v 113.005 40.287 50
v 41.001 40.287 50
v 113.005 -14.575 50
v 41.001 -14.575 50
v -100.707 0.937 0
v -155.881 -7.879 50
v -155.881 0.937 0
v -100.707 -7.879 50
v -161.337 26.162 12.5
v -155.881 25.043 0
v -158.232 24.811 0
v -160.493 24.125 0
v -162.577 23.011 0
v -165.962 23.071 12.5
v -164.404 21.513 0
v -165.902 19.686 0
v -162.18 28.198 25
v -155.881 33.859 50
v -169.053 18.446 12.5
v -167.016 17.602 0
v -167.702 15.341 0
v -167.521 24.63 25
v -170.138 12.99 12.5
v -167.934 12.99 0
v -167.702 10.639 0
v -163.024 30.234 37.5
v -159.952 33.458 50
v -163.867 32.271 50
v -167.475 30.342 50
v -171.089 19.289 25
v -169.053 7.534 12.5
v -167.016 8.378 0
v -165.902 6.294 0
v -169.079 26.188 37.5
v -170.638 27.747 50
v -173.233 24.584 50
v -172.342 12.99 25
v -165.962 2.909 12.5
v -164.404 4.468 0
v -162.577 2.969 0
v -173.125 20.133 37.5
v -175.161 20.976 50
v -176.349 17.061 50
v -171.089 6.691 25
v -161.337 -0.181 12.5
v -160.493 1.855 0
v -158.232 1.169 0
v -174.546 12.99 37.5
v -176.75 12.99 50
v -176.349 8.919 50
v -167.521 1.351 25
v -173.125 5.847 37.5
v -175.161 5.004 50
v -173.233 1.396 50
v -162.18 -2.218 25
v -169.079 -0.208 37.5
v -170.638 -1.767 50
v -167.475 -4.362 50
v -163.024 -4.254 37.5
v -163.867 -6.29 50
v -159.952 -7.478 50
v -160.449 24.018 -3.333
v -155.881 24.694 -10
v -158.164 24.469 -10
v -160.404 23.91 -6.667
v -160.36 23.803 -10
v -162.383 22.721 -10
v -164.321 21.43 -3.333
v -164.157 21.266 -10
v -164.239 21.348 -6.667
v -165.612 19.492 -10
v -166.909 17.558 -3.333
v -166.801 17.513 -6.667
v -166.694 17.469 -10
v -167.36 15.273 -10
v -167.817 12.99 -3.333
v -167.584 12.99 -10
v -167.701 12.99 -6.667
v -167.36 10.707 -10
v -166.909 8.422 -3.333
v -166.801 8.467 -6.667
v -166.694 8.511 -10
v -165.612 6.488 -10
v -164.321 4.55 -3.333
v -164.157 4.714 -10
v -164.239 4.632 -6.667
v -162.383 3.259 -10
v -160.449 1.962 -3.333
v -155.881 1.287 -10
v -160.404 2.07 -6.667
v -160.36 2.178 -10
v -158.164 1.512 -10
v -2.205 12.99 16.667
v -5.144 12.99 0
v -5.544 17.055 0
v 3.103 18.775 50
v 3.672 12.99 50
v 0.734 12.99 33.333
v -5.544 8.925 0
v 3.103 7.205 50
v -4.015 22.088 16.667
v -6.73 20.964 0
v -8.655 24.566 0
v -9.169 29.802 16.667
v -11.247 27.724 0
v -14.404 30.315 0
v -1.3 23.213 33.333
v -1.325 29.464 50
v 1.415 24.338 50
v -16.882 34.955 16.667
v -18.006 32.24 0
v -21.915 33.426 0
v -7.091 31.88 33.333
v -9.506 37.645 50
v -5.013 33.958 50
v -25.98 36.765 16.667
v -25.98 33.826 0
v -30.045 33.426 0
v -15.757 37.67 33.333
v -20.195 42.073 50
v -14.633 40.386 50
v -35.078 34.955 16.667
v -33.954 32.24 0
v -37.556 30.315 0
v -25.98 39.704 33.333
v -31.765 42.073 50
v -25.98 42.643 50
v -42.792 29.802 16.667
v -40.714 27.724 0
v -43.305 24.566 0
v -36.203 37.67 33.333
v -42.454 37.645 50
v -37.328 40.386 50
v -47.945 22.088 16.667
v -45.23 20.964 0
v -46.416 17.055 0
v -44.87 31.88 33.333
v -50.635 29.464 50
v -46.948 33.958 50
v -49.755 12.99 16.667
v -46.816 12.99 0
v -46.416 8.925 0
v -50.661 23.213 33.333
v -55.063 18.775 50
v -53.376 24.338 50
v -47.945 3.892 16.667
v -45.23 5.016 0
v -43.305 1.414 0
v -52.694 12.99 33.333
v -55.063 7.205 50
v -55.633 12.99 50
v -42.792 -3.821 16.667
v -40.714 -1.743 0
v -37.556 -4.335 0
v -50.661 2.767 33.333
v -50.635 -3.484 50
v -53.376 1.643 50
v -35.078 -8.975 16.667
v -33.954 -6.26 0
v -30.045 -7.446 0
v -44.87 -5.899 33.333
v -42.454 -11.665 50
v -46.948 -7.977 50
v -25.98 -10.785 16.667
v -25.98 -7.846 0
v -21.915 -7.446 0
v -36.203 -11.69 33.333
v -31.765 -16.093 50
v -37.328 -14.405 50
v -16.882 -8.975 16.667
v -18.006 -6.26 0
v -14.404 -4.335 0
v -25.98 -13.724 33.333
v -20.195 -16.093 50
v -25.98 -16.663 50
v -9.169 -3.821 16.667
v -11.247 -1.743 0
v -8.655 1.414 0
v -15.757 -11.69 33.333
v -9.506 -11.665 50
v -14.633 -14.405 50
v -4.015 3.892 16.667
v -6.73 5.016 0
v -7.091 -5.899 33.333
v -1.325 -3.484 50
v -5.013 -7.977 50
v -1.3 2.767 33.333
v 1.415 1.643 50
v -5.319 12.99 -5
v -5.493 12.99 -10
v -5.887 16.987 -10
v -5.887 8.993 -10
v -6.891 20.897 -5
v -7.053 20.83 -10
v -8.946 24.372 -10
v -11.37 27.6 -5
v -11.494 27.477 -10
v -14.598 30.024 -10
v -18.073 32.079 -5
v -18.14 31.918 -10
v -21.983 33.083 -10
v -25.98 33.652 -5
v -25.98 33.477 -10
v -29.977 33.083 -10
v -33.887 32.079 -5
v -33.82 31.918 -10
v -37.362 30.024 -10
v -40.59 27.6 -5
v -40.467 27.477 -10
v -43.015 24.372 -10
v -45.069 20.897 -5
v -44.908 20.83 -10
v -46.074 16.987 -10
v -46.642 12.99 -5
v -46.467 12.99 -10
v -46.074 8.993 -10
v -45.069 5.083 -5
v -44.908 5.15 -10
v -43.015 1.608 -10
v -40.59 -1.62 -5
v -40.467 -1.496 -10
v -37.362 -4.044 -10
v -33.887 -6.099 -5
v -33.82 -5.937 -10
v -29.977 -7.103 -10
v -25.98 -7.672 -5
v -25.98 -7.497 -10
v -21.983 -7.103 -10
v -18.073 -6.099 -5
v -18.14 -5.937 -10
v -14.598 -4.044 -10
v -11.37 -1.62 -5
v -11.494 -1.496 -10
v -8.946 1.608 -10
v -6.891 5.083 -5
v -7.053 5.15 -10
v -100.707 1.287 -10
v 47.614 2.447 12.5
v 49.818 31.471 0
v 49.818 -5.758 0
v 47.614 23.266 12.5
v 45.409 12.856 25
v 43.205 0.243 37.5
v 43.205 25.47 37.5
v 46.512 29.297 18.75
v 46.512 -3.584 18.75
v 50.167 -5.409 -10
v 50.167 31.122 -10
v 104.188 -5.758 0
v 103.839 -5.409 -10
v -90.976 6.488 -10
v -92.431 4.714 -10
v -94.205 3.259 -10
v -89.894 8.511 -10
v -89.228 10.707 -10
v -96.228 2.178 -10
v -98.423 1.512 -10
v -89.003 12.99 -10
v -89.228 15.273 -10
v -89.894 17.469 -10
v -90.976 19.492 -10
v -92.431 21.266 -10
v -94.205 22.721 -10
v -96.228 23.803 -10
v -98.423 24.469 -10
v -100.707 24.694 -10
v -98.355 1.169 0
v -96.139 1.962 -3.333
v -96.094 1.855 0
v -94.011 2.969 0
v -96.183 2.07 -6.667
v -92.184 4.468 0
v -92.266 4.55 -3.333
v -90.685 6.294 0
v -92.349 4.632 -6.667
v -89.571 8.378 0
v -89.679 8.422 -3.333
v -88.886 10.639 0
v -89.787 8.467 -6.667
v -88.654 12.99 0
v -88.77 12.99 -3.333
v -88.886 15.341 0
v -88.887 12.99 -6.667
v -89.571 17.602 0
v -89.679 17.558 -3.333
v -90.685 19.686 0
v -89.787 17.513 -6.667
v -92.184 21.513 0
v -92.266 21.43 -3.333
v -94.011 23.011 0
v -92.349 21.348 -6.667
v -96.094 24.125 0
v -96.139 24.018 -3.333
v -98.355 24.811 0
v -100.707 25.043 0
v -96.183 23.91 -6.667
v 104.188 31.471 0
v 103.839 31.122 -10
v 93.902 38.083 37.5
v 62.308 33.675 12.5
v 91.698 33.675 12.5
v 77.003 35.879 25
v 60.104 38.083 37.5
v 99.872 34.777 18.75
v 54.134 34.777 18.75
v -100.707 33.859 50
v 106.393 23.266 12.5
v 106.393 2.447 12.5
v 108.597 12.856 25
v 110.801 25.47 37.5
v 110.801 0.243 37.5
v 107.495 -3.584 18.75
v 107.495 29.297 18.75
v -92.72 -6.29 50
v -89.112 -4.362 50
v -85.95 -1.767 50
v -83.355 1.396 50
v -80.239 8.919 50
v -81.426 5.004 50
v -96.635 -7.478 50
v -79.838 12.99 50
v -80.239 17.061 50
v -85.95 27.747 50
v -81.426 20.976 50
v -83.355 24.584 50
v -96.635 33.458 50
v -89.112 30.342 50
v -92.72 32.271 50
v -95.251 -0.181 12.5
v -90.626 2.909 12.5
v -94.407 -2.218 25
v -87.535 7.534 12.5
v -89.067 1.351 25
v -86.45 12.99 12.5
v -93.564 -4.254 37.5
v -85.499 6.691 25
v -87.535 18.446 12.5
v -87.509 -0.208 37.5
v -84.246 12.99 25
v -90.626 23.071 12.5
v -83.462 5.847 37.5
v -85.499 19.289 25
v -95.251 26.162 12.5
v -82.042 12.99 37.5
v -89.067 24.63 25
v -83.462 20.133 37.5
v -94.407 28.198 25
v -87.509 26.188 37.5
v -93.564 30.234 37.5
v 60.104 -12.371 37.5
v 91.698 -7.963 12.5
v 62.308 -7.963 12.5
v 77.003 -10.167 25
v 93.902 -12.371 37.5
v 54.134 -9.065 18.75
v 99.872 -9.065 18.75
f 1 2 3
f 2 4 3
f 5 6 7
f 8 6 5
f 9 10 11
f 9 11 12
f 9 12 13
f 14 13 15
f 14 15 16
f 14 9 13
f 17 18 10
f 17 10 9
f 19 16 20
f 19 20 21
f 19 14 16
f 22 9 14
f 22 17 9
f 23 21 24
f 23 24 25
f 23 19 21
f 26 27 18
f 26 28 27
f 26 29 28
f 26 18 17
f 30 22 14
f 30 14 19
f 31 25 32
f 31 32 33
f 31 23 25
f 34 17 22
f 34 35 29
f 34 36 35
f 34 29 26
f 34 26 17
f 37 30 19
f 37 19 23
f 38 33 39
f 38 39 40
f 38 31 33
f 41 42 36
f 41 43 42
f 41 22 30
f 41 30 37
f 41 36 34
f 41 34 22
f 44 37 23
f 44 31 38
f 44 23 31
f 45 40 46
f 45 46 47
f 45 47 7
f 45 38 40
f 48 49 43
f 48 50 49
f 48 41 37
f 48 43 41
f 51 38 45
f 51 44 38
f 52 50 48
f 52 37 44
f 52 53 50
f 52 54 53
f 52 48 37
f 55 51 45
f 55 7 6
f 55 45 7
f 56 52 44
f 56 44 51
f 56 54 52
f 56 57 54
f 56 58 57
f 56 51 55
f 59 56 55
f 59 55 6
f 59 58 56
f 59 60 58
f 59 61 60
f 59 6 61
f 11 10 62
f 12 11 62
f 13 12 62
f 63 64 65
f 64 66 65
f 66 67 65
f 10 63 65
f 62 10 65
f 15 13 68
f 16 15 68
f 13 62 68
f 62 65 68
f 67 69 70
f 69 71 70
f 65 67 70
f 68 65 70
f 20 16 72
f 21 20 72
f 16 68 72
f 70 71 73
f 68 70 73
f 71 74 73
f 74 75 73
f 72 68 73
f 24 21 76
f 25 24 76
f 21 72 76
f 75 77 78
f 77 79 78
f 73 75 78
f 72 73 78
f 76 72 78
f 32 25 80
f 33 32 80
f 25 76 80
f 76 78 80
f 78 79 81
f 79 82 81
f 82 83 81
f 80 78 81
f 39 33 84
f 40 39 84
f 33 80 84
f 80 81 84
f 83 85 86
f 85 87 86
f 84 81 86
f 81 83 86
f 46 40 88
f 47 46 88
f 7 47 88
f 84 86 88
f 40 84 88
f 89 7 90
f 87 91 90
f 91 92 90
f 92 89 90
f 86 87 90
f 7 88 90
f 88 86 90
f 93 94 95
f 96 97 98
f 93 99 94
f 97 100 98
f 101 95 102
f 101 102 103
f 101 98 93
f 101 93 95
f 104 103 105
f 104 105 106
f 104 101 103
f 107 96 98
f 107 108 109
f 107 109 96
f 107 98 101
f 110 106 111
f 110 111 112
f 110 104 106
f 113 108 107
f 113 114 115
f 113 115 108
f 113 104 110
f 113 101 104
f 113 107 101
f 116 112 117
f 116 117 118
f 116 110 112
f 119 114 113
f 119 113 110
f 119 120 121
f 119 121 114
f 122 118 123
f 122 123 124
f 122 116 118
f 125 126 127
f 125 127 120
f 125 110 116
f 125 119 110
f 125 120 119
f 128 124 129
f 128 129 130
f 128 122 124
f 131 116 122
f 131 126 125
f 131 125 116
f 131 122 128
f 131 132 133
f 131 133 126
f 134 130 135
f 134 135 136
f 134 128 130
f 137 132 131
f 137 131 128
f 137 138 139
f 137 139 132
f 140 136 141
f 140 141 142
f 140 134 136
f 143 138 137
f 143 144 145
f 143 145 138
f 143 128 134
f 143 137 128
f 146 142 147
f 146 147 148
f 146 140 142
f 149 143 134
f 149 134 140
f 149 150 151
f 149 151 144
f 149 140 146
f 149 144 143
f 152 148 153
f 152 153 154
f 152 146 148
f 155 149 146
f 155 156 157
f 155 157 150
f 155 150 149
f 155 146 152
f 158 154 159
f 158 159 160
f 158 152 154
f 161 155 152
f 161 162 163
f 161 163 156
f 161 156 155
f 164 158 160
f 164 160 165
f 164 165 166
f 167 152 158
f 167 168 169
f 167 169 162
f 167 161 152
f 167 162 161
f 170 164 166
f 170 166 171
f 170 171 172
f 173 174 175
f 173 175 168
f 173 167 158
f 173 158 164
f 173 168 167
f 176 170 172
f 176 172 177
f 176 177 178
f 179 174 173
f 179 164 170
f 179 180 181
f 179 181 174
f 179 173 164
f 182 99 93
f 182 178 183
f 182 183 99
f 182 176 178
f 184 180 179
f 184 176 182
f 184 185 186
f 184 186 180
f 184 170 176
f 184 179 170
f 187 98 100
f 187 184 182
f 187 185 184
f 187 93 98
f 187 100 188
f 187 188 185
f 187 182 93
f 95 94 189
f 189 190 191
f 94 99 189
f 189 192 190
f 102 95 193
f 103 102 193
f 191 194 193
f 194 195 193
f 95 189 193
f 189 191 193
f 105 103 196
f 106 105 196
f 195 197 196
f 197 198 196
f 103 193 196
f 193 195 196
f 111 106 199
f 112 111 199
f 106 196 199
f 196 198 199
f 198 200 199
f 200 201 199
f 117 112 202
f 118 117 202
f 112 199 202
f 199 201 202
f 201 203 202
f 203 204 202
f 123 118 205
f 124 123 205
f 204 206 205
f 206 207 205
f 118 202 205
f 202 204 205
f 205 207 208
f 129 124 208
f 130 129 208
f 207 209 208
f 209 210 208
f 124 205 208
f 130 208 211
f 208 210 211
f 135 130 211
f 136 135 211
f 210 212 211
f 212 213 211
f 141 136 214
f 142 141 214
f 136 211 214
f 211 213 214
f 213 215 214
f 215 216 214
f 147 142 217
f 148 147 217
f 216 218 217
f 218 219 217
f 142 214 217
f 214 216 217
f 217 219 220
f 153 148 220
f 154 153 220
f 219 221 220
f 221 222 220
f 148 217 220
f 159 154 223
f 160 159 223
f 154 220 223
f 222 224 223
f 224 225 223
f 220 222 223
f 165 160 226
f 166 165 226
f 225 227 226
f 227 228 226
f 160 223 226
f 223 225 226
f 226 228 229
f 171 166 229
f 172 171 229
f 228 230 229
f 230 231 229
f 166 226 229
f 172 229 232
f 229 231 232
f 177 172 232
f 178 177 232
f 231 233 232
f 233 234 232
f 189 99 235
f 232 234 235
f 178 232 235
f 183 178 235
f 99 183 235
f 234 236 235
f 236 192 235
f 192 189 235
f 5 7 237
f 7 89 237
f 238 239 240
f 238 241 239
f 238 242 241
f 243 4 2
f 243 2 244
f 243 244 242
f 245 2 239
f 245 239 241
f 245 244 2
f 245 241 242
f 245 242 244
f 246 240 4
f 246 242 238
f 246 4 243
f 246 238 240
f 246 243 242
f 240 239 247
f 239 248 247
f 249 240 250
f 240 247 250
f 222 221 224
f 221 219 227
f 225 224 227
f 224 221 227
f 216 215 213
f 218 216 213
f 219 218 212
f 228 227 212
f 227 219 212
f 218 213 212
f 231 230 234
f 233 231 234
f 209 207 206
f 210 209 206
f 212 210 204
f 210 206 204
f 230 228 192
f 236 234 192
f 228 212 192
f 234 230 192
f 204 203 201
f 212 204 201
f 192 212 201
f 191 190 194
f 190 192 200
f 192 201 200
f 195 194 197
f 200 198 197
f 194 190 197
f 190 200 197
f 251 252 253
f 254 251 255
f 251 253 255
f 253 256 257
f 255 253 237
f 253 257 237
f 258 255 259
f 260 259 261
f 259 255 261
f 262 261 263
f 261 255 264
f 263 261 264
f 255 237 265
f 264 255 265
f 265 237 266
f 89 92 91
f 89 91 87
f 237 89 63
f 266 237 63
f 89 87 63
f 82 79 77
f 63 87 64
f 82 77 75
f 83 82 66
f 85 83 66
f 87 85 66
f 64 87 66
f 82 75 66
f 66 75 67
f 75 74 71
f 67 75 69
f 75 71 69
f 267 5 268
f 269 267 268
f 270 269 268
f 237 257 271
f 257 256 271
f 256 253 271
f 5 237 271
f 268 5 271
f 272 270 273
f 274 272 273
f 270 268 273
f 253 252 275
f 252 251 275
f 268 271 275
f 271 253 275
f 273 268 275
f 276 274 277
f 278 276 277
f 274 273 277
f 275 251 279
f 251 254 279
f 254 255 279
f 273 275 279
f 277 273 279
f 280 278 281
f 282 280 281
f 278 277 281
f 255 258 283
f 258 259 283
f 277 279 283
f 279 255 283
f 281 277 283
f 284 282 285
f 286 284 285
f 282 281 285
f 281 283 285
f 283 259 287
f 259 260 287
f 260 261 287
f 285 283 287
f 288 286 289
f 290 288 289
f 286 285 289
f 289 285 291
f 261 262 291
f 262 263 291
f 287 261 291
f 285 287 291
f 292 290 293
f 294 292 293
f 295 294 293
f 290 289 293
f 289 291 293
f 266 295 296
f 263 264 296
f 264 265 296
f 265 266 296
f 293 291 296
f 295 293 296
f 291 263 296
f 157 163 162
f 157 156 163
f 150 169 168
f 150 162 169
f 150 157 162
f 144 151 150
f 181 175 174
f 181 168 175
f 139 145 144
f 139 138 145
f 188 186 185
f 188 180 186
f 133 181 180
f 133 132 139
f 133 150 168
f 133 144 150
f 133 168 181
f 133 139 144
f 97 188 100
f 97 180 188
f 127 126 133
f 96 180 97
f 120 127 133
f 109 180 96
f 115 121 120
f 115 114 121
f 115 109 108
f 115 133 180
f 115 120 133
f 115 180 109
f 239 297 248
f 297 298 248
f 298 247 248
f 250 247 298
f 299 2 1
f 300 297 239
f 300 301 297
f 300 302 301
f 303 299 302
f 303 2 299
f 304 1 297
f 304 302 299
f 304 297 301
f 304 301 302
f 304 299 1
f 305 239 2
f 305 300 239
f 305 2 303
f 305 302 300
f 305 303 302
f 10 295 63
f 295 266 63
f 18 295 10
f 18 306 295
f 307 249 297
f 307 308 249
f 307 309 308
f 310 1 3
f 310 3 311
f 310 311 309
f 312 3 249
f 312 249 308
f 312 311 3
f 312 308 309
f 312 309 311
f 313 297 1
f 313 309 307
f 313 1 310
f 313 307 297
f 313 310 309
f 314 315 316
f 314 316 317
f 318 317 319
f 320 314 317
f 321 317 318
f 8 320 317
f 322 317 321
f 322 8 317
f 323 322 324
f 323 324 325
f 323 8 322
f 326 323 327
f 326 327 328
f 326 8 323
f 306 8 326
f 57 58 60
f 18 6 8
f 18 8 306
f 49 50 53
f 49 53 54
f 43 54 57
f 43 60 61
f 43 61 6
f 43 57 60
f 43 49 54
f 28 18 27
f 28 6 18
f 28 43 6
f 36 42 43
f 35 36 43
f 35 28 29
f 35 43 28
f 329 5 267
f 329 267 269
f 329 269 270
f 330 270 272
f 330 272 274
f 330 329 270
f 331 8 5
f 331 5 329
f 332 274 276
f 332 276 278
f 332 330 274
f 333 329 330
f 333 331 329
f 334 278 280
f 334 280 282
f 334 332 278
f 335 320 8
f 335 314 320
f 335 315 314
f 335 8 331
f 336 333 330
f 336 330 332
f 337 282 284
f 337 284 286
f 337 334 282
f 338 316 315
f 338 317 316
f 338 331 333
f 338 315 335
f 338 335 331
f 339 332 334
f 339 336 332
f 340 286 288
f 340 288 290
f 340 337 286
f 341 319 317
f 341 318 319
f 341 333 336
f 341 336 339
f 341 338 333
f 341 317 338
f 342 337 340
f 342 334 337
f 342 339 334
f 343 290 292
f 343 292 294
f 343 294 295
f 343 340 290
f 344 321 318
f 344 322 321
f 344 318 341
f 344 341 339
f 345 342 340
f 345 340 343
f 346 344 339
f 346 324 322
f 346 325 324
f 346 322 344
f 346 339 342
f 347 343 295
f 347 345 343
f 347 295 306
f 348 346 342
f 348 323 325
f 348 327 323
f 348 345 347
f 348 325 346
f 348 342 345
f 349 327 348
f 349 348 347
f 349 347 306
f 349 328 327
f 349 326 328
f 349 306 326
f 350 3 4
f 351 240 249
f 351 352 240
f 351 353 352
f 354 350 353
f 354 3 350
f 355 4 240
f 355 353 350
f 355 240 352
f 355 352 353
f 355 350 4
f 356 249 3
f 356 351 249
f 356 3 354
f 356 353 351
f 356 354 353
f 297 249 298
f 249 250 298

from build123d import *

# Parameters (mm, degrees)
SKETCH4_R                     = 20.836253608
SKETCH4_W                     = 54.370861329
SKETCH4_H                     = 37.229308989
BOSS_EXTRUDE1_DEPTH           = 50
BOSS_EXTRUDE1_TAPER           = -10
BOSS_EXTRUDE1_OTHER_WAY_DEPTH = 10
BOSS_EXTRUDE1_OTHER_WAY_TAPER = 2


with BuildPart() as part:
    # Sketch4 → Boss-Extrude1 (new body)
    with BuildSketch(Plane.XY):
        with Locations((-25.980165266, 12.990082633)):
            Circle(SKETCH4_R)
        with BuildLine():
            ThreePointArc((-155.880991595, 25.042736622), (-167.933645584, 12.990082633), (-155.880991595, 0.937428644))
            Line((-155.880991595, 0.937428644), (-100.706619999, 0.937428644))
            ThreePointArc((-100.706619999, 0.937428644), (-88.65396601, 12.990082633), (-100.706619999, 25.042736622))
            Line((-100.706619999, 25.042736622), (-155.880991595, 25.042736622))
        make_face()
        with Locations((77.003067153, 12.856164256)):
            Rectangle(SKETCH4_W, SKETCH4_H)
    extrude(amount=BOSS_EXTRUDE1_DEPTH, taper=BOSS_EXTRUDE1_TAPER)

    # Sketch4 → Boss-Extrude1 other way (add)
    with BuildSketch(Plane.XY):
        with Locations((-25.980165266, 12.990082633)):
            Circle(SKETCH4_R)
        with BuildLine():
            ThreePointArc((-155.880991595, 25.042736622), (-167.933645584, 12.990082633), (-155.880991595, 0.937428644))
            Line((-155.880991595, 0.937428644), (-100.706619999, 0.937428644))
            ThreePointArc((-100.706619999, 0.937428644), (-88.65396601, 12.990082633), (-100.706619999, 25.042736622))
            Line((-100.706619999, 25.042736622), (-155.880991595, 25.042736622))
        make_face()
        with Locations((77.003067153, 12.856164256)):
            Rectangle(SKETCH4_W, SKETCH4_H)
    extrude(amount=-BOSS_EXTRUDE1_OTHER_WAY_DEPTH, taper=BOSS_EXTRUDE1_OTHER_WAY_TAPER)


solid = part.part
